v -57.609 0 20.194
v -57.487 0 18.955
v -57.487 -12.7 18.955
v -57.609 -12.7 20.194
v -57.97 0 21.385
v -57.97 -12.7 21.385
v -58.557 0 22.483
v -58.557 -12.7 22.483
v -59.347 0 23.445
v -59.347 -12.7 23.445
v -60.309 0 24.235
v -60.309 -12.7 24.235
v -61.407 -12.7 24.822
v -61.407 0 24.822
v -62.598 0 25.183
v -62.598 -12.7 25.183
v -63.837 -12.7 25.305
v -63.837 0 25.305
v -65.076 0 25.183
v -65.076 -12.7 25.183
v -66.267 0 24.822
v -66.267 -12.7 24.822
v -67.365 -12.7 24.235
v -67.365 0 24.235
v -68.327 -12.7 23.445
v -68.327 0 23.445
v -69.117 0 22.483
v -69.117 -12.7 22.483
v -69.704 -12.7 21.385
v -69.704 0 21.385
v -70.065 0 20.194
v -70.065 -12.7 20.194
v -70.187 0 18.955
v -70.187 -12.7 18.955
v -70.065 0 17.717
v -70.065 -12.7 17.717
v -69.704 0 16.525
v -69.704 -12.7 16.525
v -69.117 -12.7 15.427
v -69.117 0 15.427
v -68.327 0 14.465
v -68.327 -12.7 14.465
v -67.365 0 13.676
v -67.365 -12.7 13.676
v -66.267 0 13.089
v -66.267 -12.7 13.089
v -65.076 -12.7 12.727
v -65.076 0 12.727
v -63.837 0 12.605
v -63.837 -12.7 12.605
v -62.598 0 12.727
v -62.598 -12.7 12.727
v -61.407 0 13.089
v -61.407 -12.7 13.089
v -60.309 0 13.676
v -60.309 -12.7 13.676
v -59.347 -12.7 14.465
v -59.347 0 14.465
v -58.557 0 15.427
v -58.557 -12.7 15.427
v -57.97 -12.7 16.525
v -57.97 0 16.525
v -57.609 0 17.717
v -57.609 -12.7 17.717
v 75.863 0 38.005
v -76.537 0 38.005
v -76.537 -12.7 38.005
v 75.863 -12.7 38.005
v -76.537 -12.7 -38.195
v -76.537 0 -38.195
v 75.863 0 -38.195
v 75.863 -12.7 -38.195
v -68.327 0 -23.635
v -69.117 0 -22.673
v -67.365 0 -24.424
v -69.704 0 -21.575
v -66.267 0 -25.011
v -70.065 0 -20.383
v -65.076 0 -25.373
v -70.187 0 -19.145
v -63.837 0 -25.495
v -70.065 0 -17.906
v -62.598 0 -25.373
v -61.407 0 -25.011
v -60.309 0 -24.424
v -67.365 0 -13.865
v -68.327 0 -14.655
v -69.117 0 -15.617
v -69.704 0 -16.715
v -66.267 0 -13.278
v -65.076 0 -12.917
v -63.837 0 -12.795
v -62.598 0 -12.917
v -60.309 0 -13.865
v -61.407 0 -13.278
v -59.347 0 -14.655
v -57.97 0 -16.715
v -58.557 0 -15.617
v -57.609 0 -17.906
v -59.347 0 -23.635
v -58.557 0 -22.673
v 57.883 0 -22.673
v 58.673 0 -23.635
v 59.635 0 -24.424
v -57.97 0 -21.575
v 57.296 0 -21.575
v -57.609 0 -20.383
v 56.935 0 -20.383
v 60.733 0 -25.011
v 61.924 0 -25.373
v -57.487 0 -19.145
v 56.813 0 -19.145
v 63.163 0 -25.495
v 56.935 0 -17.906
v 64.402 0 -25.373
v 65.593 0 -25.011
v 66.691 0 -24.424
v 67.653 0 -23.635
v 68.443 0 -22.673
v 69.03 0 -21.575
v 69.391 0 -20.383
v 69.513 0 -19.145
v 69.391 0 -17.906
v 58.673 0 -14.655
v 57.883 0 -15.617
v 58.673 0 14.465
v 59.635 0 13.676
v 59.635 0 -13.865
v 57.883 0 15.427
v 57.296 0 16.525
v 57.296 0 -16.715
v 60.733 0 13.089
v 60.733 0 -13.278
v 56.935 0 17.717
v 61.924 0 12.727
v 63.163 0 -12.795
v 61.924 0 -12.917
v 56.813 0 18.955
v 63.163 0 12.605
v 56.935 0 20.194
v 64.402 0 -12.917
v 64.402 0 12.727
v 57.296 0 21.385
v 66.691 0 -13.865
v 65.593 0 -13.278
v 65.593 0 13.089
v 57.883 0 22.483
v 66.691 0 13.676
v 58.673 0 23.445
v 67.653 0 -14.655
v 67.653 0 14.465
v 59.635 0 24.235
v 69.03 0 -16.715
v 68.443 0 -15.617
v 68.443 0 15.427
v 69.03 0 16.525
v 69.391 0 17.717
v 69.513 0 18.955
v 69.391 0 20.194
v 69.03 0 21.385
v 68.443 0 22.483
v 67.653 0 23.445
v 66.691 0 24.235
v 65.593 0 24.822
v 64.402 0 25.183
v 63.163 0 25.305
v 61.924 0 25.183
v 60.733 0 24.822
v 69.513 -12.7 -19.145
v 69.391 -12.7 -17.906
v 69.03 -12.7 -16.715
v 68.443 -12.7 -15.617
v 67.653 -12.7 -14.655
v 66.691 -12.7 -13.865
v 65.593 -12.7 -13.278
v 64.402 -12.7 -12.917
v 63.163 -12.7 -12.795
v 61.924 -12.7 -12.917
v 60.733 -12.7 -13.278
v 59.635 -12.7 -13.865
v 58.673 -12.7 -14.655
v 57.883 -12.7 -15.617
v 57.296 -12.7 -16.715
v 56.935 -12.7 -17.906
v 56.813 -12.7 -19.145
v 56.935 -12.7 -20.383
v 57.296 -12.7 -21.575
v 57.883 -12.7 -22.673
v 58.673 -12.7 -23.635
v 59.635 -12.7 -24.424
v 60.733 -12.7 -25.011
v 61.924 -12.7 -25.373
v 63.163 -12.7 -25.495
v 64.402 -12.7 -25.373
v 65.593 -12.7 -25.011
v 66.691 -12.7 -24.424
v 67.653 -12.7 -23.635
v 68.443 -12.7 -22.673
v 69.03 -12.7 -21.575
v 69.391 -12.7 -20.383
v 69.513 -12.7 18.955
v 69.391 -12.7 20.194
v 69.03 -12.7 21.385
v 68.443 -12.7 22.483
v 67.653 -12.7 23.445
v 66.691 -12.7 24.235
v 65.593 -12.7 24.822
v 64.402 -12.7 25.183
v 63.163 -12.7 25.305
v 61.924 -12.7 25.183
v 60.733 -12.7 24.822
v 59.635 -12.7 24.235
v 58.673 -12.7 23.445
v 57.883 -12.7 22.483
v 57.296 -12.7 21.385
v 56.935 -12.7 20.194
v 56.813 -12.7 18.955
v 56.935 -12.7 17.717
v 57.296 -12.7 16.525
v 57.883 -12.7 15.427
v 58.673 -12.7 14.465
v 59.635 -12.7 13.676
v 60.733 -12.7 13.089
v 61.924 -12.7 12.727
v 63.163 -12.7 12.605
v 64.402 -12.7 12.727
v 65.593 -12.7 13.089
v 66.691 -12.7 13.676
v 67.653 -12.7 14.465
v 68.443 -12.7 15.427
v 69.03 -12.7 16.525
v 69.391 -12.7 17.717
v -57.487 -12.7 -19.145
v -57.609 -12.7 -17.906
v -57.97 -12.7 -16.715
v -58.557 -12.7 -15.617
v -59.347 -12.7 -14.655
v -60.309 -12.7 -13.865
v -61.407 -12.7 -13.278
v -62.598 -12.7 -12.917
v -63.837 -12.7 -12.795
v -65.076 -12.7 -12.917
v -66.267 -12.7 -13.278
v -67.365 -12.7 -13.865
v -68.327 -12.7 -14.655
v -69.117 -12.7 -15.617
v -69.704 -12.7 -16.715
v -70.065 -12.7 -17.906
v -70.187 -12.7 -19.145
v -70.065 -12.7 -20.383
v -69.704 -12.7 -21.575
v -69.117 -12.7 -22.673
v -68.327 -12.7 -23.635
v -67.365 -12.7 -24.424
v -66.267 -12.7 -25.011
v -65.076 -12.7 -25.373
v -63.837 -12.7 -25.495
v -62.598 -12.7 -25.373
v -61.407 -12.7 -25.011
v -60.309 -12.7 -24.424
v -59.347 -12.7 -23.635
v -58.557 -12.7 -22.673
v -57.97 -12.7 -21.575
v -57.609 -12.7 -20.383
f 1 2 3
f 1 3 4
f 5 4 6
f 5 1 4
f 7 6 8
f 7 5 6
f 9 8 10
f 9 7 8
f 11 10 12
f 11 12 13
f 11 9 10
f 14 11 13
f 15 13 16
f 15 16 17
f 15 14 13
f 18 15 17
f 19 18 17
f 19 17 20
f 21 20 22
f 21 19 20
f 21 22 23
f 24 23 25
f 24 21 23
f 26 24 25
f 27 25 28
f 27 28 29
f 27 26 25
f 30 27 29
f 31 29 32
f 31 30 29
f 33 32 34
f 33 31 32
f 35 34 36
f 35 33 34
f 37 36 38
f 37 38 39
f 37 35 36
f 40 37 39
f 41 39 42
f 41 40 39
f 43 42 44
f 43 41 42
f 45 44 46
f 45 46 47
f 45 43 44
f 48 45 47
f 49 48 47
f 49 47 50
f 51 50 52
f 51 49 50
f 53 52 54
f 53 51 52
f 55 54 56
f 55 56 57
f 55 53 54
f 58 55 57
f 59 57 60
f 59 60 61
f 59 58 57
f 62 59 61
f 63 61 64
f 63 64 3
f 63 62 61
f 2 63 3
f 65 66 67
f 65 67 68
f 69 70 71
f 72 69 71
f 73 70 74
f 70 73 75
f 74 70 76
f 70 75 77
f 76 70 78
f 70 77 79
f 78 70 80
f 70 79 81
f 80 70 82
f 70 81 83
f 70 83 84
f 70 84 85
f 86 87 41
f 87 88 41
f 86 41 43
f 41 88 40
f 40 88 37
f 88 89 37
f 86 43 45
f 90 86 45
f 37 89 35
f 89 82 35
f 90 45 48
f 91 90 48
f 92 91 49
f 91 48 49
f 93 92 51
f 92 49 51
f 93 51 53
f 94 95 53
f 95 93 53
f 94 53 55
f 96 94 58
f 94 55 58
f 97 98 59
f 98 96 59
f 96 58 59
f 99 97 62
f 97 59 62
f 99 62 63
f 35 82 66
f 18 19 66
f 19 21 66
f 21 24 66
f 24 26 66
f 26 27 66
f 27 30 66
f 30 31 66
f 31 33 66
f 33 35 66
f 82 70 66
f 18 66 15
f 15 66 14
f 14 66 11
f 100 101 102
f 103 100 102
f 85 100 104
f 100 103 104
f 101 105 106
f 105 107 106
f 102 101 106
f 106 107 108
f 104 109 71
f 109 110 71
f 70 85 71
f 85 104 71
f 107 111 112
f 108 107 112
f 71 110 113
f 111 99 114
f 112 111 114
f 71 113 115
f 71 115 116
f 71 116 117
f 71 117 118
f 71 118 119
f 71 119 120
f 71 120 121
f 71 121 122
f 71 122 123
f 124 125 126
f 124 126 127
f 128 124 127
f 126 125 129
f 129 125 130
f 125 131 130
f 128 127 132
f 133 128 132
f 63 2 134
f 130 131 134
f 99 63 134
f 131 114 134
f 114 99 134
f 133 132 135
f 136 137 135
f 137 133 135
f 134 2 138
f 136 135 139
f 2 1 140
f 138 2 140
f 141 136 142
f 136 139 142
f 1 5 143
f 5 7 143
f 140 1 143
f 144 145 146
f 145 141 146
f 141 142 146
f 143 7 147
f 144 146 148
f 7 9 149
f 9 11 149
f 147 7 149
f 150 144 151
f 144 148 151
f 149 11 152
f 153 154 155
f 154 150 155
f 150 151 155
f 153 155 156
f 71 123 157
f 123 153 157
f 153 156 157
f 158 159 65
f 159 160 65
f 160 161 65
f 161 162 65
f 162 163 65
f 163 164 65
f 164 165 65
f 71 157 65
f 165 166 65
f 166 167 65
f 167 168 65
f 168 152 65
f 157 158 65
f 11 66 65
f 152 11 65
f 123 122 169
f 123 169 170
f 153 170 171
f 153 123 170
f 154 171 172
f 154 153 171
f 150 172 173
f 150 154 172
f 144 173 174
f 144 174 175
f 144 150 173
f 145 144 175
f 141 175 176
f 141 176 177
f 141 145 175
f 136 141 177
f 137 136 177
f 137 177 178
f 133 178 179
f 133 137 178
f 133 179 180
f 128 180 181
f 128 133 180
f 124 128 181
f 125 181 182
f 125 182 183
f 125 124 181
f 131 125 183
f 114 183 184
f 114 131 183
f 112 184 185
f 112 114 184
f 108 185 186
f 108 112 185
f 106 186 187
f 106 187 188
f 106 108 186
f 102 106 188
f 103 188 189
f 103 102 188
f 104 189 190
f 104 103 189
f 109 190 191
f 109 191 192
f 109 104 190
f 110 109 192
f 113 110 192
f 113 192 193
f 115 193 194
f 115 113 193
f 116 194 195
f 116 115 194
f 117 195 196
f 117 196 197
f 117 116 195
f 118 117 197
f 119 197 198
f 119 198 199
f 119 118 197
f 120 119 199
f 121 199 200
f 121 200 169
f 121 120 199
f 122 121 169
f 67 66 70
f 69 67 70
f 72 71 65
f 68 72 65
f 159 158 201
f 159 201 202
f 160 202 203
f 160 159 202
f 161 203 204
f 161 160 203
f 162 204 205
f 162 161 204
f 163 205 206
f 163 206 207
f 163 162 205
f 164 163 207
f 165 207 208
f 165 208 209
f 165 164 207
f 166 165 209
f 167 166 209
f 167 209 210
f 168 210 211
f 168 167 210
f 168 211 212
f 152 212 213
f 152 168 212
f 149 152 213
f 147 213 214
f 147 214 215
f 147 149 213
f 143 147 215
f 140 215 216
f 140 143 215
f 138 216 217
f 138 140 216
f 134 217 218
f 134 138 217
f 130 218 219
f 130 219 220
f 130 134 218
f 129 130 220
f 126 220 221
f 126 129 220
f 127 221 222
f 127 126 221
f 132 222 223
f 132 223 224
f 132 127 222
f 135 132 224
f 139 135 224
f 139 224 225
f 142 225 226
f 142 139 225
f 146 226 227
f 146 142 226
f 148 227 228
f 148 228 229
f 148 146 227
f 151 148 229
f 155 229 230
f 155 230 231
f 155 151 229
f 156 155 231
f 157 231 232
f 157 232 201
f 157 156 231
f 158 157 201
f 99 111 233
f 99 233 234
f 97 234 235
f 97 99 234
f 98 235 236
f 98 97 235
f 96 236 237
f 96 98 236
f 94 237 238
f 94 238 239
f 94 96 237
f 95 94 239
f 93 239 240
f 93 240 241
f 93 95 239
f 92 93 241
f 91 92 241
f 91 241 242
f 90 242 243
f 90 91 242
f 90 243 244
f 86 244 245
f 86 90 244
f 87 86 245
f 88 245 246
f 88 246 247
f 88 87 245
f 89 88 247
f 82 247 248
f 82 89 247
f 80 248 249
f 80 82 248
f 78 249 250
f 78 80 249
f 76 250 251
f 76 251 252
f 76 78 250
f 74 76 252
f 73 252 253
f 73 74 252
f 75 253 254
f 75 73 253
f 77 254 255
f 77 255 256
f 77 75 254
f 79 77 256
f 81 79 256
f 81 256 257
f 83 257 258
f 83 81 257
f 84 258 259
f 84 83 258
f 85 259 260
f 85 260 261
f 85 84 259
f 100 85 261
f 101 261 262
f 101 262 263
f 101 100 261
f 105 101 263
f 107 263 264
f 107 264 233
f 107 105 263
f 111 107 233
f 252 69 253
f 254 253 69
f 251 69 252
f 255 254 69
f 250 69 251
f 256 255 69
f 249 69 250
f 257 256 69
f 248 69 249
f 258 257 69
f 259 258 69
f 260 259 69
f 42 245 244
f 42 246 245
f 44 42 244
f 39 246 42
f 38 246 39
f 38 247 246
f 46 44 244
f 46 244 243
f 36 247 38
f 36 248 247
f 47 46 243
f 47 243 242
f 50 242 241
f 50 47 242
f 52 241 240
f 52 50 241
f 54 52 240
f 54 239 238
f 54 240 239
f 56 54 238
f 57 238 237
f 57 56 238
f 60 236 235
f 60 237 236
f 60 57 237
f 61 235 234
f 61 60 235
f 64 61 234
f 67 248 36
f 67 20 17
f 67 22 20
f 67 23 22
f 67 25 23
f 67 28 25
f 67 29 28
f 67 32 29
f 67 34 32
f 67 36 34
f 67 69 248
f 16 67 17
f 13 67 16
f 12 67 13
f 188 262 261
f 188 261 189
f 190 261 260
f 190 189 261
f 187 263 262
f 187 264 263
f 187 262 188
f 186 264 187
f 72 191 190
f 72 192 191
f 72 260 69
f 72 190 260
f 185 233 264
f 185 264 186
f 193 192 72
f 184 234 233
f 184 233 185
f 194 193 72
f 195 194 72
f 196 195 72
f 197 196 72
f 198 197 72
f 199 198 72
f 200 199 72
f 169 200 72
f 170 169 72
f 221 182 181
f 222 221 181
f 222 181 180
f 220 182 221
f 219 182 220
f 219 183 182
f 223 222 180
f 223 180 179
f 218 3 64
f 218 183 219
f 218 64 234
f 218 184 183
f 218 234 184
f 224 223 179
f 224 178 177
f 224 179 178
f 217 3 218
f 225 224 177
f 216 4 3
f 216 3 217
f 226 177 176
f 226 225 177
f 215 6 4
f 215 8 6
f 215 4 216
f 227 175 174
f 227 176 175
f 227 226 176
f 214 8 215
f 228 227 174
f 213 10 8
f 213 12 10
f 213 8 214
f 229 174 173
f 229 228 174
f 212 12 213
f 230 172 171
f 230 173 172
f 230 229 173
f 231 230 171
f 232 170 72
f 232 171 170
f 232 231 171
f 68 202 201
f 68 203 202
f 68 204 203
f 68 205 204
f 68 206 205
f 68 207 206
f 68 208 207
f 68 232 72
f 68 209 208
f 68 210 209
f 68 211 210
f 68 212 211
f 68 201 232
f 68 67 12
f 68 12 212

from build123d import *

# Parameters (mm, degrees)
F0_W     = 152.4
F0_H     = 38.1
F0_R     = 6.35
F1_DEPTH = 12.7
F2_DEPTH = 12.7


with BuildPart() as f1:
    # F0 (on Front) → F1 (new body)
    with BuildSketch(Plane.XZ):
        with Locations((-0.336899, 18.955347)):
            Rectangle(F0_W, F0_H)
        with Locations((-63.836899, 18.955347)):
            Circle(F0_R, mode=Mode.SUBTRACT)
        with Locations((63.163101, 18.955347)):
            Circle(F0_R, mode=Mode.SUBTRACT)
    extrude(amount=F1_DEPTH)

    # F0 (on Front) → F2 (join)
    with BuildSketch(Plane.XZ):
        Polygon((75.863101, -0.094653), (-76.536899, -0.094653), (-76.536899, -38.194653), (-0.336899, -38.194653), (75.863101, -38.194653), align=None)
        with Locations((-63.836899, -19.144653)):
            Circle(F0_R, mode=Mode.SUBTRACT)
        with Locations((63.163101, -19.144653)):
            Circle(F0_R, mode=Mode.SUBTRACT)
    extrude(amount=F2_DEPTH)


solid = f1.part
